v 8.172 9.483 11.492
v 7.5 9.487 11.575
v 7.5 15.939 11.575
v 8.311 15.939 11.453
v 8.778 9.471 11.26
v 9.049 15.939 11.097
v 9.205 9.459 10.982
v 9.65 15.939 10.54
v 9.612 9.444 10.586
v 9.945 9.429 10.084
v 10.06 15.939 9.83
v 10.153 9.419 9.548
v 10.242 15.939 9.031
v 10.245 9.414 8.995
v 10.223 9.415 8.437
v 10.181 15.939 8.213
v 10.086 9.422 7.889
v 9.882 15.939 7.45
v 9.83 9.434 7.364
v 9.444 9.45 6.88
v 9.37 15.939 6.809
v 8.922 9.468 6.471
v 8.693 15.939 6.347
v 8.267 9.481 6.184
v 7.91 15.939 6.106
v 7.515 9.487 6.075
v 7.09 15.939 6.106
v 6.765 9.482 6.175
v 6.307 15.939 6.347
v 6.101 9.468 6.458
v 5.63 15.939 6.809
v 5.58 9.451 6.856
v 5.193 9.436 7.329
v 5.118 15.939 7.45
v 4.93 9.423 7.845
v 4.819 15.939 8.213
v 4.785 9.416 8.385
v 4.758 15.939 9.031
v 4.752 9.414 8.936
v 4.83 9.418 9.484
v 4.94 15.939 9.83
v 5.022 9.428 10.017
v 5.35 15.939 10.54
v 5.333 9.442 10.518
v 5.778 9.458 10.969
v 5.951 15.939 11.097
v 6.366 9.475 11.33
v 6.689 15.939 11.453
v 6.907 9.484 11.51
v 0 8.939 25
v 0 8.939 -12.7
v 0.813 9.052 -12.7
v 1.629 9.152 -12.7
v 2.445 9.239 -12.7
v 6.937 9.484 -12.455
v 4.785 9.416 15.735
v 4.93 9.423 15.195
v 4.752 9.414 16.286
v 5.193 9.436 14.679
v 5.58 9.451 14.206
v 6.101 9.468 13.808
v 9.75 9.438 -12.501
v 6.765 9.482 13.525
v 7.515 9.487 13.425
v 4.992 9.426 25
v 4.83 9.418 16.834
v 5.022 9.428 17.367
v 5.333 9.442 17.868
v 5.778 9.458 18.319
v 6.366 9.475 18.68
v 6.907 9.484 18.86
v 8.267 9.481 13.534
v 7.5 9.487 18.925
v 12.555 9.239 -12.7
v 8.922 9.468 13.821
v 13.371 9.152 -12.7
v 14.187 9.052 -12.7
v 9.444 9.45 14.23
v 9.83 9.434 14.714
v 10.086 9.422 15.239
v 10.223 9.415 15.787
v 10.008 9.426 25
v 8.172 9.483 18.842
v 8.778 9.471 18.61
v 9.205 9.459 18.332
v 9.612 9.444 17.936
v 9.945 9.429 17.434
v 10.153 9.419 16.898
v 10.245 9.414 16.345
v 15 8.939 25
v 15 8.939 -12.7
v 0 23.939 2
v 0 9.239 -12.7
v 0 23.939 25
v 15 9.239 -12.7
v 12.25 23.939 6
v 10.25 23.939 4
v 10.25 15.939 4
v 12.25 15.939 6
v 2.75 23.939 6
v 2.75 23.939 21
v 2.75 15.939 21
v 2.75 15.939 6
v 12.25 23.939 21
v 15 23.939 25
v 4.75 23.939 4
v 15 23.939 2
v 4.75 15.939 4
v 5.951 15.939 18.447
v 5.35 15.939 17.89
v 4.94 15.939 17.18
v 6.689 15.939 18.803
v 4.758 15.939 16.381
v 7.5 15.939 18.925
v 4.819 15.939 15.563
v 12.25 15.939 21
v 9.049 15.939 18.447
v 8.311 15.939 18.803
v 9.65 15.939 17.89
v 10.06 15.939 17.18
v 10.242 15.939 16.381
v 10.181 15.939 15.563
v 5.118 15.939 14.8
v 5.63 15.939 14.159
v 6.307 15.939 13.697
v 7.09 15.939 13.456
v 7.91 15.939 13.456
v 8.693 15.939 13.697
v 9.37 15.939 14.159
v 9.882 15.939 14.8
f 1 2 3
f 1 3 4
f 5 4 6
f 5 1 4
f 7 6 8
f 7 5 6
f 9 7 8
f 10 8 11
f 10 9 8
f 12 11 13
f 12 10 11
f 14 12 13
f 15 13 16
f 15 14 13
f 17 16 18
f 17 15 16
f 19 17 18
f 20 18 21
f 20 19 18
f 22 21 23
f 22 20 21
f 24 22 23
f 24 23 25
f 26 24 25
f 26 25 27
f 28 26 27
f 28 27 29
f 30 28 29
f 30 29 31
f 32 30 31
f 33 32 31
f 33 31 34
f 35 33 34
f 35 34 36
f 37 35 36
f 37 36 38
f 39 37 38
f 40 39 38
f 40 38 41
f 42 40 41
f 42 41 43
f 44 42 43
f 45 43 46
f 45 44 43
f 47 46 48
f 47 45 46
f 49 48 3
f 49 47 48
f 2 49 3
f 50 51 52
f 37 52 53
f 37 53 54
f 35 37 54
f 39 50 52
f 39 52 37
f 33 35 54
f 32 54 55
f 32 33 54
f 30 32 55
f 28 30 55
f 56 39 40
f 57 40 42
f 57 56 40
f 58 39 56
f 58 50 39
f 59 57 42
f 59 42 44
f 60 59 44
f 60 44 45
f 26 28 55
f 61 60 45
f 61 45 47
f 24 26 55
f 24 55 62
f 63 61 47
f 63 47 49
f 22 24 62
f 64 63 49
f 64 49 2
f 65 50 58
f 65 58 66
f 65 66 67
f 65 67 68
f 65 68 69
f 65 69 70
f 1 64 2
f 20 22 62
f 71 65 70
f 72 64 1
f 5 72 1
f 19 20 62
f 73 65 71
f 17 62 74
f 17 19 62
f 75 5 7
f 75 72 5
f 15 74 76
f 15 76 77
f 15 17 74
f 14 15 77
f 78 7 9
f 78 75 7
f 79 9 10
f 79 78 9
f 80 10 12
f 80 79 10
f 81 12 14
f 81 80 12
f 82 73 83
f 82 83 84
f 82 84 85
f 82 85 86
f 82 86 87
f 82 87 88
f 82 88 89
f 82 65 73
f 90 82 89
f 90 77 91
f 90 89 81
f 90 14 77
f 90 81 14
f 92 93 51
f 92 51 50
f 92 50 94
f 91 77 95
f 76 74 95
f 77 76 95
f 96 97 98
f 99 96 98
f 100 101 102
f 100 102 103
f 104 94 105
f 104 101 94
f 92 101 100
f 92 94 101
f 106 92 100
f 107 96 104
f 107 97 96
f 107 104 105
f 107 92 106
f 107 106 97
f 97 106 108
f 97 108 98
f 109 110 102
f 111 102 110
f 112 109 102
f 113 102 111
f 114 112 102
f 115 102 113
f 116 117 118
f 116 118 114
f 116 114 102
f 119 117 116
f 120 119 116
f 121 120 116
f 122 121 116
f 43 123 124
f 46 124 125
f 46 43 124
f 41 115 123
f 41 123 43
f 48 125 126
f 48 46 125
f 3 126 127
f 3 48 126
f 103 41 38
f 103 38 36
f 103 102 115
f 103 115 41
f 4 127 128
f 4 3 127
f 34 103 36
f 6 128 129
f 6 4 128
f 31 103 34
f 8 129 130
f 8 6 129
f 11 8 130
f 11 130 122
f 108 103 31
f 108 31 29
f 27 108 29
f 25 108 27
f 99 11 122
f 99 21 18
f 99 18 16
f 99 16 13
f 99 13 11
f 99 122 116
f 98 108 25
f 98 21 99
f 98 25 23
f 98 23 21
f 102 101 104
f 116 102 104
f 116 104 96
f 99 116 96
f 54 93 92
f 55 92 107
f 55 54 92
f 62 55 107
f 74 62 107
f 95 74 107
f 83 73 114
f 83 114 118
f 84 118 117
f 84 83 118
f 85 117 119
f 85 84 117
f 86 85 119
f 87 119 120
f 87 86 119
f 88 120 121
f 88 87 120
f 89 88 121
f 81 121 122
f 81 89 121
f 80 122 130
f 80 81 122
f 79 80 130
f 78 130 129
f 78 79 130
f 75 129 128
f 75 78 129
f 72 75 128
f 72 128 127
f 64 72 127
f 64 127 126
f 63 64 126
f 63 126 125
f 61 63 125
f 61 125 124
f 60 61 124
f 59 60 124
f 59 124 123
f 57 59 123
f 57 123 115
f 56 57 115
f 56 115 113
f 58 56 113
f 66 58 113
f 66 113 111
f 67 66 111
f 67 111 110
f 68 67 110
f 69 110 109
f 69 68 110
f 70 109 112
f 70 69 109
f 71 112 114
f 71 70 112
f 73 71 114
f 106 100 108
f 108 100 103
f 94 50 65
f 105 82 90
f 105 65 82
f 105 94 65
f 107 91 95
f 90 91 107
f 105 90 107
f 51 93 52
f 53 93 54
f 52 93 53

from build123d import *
from build123d.topology import SkipClean

# Parameters (mm, degrees)
SKETCH1_W               = 15
SKETCH1_H               = 23.93877551
BOSS_EXTRUDE1_DEPTH     = 25
CUT_EXTRUDE1_DEPTH      = 25
CUT_EXTRUDE2_DEPTH      = 33.787192622
CUT_EXTRUDE2_DEPTH_BACK = 33.787192622
SKETCH3_R               = 2.75
SKETCH4_W               = 9.5
SKETCH4_H               = 17
CUT_EXTRUDE3_DEPTH      = 8
CHAMFER1_SIZE           = 2
BOSS_EXTRUDE2_DEPTH     = 12.7
CHAMFER2_START          = 15.513056934
CHAMFER2_OUTLINE_W      = 15
CHAMFER2_OUTLINE_H      = 24
CHAMFER2_DEPTH          = 11.486943066


with BuildPart() as part:
    # Sketch1 → Boss-Extrude1 (new body)
    with BuildSketch(Plane.XY):
        with Locations((7.5, 11.969387755)):
            Rectangle(SKETCH1_W, SKETCH1_H)
    extrude(amount=BOSS_EXTRUDE1_DEPTH)

    # Sketch2 → Cut-Extrude1 (cut)
    with BuildSketch(Plane.XY.offset(25)):
        with BuildLine():
            Line((0, 8.93877551), (0, 0))
            Line((0, 0), (15, 0))
            Line((15, 0), (15, 8.93877551))
            ThreePointArc((15, 8.93877551), (7.5, 9.487151408), (0, 8.93877551))
        make_face()
    extrude(amount=-CUT_EXTRUDE1_DEPTH, mode=Mode.SUBTRACT)

    # Sketch3 → Cut-Extrude2 (cut, two sides: drawn at the far end of the back side and taken through both)
    with BuildSketch(Plane(origin=(0, 23.93877551, 0), x_dir=(1, 0, 0), z_dir=(0, 1, 0)).offset(-CUT_EXTRUDE2_DEPTH_BACK)):
        with Locations(Location((7.5, -8.825, 0), (0, 0, 270))):
            Circle(SKETCH3_R)
        with Locations(Location((7.5, -16.175, 0), (0, 0, 270))):
            Circle(SKETCH3_R)
    extrude(amount=CUT_EXTRUDE2_DEPTH + CUT_EXTRUDE2_DEPTH_BACK, mode=Mode.SUBTRACT)

    # Sketch4 → Cut-Extrude3 (cut)
    with BuildSketch(Plane(origin=(0, 23.93877551, 0), x_dir=(1, 0, 0), z_dir=(0, 1, 0))):
        with Locations((7.5, -12.5)):
            Rectangle(SKETCH4_W, SKETCH4_H)
    extrude(amount=-CUT_EXTRUDE3_DEPTH, mode=Mode.SUBTRACT)

    # Chamfer1
    chamfer1_edges = [part.edges().sort_by_distance(p)[0] for p in [
        (2.75, 19.93877551, 4),
        (12.25, 19.93877551, 4),
    ]]
    chamfer(chamfer1_edges, length=CHAMFER1_SIZE)

    # Sketch5 → Boss-Extrude2 (add)
    with SkipClean():  # the faces are left unmerged after this step: merging them gives an invalid solid
        with BuildSketch(Plane(origin=(0, 0, 0), x_dir=(-1, 0, 0), z_dir=(0, 0, -1))):
            with BuildLine():
                Line((-15, 23.93877551), (0, 23.93877551))
                Line((0, 23.93877551), (0, 8.93877551))
                ThreePointArc((0, 8.93877551), (-7.5, 9.487151408), (-15, 8.93877551))
                Line((-15, 8.93877551), (-15, 23.93877551))
            make_face()
        extrude(amount=BOSS_EXTRUDE2_DEPTH)

    # Chamfer2: read off the stored shape, not the designer's step
    # Chamfer2 outline → Chamfer2 (cut)
    with BuildSketch(Plane(origin=(0, 0, 0), x_dir=(1, 0, 0), z_dir=(0, 0.707106781186544, -0.707106781186551)).offset(CHAMFER2_START)):
        with Locations((7.5, -8)):
            Rectangle(CHAMFER2_OUTLINE_W, CHAMFER2_OUTLINE_H)
    extrude(amount=CHAMFER2_DEPTH, mode=Mode.SUBTRACT)


solid = part.part
